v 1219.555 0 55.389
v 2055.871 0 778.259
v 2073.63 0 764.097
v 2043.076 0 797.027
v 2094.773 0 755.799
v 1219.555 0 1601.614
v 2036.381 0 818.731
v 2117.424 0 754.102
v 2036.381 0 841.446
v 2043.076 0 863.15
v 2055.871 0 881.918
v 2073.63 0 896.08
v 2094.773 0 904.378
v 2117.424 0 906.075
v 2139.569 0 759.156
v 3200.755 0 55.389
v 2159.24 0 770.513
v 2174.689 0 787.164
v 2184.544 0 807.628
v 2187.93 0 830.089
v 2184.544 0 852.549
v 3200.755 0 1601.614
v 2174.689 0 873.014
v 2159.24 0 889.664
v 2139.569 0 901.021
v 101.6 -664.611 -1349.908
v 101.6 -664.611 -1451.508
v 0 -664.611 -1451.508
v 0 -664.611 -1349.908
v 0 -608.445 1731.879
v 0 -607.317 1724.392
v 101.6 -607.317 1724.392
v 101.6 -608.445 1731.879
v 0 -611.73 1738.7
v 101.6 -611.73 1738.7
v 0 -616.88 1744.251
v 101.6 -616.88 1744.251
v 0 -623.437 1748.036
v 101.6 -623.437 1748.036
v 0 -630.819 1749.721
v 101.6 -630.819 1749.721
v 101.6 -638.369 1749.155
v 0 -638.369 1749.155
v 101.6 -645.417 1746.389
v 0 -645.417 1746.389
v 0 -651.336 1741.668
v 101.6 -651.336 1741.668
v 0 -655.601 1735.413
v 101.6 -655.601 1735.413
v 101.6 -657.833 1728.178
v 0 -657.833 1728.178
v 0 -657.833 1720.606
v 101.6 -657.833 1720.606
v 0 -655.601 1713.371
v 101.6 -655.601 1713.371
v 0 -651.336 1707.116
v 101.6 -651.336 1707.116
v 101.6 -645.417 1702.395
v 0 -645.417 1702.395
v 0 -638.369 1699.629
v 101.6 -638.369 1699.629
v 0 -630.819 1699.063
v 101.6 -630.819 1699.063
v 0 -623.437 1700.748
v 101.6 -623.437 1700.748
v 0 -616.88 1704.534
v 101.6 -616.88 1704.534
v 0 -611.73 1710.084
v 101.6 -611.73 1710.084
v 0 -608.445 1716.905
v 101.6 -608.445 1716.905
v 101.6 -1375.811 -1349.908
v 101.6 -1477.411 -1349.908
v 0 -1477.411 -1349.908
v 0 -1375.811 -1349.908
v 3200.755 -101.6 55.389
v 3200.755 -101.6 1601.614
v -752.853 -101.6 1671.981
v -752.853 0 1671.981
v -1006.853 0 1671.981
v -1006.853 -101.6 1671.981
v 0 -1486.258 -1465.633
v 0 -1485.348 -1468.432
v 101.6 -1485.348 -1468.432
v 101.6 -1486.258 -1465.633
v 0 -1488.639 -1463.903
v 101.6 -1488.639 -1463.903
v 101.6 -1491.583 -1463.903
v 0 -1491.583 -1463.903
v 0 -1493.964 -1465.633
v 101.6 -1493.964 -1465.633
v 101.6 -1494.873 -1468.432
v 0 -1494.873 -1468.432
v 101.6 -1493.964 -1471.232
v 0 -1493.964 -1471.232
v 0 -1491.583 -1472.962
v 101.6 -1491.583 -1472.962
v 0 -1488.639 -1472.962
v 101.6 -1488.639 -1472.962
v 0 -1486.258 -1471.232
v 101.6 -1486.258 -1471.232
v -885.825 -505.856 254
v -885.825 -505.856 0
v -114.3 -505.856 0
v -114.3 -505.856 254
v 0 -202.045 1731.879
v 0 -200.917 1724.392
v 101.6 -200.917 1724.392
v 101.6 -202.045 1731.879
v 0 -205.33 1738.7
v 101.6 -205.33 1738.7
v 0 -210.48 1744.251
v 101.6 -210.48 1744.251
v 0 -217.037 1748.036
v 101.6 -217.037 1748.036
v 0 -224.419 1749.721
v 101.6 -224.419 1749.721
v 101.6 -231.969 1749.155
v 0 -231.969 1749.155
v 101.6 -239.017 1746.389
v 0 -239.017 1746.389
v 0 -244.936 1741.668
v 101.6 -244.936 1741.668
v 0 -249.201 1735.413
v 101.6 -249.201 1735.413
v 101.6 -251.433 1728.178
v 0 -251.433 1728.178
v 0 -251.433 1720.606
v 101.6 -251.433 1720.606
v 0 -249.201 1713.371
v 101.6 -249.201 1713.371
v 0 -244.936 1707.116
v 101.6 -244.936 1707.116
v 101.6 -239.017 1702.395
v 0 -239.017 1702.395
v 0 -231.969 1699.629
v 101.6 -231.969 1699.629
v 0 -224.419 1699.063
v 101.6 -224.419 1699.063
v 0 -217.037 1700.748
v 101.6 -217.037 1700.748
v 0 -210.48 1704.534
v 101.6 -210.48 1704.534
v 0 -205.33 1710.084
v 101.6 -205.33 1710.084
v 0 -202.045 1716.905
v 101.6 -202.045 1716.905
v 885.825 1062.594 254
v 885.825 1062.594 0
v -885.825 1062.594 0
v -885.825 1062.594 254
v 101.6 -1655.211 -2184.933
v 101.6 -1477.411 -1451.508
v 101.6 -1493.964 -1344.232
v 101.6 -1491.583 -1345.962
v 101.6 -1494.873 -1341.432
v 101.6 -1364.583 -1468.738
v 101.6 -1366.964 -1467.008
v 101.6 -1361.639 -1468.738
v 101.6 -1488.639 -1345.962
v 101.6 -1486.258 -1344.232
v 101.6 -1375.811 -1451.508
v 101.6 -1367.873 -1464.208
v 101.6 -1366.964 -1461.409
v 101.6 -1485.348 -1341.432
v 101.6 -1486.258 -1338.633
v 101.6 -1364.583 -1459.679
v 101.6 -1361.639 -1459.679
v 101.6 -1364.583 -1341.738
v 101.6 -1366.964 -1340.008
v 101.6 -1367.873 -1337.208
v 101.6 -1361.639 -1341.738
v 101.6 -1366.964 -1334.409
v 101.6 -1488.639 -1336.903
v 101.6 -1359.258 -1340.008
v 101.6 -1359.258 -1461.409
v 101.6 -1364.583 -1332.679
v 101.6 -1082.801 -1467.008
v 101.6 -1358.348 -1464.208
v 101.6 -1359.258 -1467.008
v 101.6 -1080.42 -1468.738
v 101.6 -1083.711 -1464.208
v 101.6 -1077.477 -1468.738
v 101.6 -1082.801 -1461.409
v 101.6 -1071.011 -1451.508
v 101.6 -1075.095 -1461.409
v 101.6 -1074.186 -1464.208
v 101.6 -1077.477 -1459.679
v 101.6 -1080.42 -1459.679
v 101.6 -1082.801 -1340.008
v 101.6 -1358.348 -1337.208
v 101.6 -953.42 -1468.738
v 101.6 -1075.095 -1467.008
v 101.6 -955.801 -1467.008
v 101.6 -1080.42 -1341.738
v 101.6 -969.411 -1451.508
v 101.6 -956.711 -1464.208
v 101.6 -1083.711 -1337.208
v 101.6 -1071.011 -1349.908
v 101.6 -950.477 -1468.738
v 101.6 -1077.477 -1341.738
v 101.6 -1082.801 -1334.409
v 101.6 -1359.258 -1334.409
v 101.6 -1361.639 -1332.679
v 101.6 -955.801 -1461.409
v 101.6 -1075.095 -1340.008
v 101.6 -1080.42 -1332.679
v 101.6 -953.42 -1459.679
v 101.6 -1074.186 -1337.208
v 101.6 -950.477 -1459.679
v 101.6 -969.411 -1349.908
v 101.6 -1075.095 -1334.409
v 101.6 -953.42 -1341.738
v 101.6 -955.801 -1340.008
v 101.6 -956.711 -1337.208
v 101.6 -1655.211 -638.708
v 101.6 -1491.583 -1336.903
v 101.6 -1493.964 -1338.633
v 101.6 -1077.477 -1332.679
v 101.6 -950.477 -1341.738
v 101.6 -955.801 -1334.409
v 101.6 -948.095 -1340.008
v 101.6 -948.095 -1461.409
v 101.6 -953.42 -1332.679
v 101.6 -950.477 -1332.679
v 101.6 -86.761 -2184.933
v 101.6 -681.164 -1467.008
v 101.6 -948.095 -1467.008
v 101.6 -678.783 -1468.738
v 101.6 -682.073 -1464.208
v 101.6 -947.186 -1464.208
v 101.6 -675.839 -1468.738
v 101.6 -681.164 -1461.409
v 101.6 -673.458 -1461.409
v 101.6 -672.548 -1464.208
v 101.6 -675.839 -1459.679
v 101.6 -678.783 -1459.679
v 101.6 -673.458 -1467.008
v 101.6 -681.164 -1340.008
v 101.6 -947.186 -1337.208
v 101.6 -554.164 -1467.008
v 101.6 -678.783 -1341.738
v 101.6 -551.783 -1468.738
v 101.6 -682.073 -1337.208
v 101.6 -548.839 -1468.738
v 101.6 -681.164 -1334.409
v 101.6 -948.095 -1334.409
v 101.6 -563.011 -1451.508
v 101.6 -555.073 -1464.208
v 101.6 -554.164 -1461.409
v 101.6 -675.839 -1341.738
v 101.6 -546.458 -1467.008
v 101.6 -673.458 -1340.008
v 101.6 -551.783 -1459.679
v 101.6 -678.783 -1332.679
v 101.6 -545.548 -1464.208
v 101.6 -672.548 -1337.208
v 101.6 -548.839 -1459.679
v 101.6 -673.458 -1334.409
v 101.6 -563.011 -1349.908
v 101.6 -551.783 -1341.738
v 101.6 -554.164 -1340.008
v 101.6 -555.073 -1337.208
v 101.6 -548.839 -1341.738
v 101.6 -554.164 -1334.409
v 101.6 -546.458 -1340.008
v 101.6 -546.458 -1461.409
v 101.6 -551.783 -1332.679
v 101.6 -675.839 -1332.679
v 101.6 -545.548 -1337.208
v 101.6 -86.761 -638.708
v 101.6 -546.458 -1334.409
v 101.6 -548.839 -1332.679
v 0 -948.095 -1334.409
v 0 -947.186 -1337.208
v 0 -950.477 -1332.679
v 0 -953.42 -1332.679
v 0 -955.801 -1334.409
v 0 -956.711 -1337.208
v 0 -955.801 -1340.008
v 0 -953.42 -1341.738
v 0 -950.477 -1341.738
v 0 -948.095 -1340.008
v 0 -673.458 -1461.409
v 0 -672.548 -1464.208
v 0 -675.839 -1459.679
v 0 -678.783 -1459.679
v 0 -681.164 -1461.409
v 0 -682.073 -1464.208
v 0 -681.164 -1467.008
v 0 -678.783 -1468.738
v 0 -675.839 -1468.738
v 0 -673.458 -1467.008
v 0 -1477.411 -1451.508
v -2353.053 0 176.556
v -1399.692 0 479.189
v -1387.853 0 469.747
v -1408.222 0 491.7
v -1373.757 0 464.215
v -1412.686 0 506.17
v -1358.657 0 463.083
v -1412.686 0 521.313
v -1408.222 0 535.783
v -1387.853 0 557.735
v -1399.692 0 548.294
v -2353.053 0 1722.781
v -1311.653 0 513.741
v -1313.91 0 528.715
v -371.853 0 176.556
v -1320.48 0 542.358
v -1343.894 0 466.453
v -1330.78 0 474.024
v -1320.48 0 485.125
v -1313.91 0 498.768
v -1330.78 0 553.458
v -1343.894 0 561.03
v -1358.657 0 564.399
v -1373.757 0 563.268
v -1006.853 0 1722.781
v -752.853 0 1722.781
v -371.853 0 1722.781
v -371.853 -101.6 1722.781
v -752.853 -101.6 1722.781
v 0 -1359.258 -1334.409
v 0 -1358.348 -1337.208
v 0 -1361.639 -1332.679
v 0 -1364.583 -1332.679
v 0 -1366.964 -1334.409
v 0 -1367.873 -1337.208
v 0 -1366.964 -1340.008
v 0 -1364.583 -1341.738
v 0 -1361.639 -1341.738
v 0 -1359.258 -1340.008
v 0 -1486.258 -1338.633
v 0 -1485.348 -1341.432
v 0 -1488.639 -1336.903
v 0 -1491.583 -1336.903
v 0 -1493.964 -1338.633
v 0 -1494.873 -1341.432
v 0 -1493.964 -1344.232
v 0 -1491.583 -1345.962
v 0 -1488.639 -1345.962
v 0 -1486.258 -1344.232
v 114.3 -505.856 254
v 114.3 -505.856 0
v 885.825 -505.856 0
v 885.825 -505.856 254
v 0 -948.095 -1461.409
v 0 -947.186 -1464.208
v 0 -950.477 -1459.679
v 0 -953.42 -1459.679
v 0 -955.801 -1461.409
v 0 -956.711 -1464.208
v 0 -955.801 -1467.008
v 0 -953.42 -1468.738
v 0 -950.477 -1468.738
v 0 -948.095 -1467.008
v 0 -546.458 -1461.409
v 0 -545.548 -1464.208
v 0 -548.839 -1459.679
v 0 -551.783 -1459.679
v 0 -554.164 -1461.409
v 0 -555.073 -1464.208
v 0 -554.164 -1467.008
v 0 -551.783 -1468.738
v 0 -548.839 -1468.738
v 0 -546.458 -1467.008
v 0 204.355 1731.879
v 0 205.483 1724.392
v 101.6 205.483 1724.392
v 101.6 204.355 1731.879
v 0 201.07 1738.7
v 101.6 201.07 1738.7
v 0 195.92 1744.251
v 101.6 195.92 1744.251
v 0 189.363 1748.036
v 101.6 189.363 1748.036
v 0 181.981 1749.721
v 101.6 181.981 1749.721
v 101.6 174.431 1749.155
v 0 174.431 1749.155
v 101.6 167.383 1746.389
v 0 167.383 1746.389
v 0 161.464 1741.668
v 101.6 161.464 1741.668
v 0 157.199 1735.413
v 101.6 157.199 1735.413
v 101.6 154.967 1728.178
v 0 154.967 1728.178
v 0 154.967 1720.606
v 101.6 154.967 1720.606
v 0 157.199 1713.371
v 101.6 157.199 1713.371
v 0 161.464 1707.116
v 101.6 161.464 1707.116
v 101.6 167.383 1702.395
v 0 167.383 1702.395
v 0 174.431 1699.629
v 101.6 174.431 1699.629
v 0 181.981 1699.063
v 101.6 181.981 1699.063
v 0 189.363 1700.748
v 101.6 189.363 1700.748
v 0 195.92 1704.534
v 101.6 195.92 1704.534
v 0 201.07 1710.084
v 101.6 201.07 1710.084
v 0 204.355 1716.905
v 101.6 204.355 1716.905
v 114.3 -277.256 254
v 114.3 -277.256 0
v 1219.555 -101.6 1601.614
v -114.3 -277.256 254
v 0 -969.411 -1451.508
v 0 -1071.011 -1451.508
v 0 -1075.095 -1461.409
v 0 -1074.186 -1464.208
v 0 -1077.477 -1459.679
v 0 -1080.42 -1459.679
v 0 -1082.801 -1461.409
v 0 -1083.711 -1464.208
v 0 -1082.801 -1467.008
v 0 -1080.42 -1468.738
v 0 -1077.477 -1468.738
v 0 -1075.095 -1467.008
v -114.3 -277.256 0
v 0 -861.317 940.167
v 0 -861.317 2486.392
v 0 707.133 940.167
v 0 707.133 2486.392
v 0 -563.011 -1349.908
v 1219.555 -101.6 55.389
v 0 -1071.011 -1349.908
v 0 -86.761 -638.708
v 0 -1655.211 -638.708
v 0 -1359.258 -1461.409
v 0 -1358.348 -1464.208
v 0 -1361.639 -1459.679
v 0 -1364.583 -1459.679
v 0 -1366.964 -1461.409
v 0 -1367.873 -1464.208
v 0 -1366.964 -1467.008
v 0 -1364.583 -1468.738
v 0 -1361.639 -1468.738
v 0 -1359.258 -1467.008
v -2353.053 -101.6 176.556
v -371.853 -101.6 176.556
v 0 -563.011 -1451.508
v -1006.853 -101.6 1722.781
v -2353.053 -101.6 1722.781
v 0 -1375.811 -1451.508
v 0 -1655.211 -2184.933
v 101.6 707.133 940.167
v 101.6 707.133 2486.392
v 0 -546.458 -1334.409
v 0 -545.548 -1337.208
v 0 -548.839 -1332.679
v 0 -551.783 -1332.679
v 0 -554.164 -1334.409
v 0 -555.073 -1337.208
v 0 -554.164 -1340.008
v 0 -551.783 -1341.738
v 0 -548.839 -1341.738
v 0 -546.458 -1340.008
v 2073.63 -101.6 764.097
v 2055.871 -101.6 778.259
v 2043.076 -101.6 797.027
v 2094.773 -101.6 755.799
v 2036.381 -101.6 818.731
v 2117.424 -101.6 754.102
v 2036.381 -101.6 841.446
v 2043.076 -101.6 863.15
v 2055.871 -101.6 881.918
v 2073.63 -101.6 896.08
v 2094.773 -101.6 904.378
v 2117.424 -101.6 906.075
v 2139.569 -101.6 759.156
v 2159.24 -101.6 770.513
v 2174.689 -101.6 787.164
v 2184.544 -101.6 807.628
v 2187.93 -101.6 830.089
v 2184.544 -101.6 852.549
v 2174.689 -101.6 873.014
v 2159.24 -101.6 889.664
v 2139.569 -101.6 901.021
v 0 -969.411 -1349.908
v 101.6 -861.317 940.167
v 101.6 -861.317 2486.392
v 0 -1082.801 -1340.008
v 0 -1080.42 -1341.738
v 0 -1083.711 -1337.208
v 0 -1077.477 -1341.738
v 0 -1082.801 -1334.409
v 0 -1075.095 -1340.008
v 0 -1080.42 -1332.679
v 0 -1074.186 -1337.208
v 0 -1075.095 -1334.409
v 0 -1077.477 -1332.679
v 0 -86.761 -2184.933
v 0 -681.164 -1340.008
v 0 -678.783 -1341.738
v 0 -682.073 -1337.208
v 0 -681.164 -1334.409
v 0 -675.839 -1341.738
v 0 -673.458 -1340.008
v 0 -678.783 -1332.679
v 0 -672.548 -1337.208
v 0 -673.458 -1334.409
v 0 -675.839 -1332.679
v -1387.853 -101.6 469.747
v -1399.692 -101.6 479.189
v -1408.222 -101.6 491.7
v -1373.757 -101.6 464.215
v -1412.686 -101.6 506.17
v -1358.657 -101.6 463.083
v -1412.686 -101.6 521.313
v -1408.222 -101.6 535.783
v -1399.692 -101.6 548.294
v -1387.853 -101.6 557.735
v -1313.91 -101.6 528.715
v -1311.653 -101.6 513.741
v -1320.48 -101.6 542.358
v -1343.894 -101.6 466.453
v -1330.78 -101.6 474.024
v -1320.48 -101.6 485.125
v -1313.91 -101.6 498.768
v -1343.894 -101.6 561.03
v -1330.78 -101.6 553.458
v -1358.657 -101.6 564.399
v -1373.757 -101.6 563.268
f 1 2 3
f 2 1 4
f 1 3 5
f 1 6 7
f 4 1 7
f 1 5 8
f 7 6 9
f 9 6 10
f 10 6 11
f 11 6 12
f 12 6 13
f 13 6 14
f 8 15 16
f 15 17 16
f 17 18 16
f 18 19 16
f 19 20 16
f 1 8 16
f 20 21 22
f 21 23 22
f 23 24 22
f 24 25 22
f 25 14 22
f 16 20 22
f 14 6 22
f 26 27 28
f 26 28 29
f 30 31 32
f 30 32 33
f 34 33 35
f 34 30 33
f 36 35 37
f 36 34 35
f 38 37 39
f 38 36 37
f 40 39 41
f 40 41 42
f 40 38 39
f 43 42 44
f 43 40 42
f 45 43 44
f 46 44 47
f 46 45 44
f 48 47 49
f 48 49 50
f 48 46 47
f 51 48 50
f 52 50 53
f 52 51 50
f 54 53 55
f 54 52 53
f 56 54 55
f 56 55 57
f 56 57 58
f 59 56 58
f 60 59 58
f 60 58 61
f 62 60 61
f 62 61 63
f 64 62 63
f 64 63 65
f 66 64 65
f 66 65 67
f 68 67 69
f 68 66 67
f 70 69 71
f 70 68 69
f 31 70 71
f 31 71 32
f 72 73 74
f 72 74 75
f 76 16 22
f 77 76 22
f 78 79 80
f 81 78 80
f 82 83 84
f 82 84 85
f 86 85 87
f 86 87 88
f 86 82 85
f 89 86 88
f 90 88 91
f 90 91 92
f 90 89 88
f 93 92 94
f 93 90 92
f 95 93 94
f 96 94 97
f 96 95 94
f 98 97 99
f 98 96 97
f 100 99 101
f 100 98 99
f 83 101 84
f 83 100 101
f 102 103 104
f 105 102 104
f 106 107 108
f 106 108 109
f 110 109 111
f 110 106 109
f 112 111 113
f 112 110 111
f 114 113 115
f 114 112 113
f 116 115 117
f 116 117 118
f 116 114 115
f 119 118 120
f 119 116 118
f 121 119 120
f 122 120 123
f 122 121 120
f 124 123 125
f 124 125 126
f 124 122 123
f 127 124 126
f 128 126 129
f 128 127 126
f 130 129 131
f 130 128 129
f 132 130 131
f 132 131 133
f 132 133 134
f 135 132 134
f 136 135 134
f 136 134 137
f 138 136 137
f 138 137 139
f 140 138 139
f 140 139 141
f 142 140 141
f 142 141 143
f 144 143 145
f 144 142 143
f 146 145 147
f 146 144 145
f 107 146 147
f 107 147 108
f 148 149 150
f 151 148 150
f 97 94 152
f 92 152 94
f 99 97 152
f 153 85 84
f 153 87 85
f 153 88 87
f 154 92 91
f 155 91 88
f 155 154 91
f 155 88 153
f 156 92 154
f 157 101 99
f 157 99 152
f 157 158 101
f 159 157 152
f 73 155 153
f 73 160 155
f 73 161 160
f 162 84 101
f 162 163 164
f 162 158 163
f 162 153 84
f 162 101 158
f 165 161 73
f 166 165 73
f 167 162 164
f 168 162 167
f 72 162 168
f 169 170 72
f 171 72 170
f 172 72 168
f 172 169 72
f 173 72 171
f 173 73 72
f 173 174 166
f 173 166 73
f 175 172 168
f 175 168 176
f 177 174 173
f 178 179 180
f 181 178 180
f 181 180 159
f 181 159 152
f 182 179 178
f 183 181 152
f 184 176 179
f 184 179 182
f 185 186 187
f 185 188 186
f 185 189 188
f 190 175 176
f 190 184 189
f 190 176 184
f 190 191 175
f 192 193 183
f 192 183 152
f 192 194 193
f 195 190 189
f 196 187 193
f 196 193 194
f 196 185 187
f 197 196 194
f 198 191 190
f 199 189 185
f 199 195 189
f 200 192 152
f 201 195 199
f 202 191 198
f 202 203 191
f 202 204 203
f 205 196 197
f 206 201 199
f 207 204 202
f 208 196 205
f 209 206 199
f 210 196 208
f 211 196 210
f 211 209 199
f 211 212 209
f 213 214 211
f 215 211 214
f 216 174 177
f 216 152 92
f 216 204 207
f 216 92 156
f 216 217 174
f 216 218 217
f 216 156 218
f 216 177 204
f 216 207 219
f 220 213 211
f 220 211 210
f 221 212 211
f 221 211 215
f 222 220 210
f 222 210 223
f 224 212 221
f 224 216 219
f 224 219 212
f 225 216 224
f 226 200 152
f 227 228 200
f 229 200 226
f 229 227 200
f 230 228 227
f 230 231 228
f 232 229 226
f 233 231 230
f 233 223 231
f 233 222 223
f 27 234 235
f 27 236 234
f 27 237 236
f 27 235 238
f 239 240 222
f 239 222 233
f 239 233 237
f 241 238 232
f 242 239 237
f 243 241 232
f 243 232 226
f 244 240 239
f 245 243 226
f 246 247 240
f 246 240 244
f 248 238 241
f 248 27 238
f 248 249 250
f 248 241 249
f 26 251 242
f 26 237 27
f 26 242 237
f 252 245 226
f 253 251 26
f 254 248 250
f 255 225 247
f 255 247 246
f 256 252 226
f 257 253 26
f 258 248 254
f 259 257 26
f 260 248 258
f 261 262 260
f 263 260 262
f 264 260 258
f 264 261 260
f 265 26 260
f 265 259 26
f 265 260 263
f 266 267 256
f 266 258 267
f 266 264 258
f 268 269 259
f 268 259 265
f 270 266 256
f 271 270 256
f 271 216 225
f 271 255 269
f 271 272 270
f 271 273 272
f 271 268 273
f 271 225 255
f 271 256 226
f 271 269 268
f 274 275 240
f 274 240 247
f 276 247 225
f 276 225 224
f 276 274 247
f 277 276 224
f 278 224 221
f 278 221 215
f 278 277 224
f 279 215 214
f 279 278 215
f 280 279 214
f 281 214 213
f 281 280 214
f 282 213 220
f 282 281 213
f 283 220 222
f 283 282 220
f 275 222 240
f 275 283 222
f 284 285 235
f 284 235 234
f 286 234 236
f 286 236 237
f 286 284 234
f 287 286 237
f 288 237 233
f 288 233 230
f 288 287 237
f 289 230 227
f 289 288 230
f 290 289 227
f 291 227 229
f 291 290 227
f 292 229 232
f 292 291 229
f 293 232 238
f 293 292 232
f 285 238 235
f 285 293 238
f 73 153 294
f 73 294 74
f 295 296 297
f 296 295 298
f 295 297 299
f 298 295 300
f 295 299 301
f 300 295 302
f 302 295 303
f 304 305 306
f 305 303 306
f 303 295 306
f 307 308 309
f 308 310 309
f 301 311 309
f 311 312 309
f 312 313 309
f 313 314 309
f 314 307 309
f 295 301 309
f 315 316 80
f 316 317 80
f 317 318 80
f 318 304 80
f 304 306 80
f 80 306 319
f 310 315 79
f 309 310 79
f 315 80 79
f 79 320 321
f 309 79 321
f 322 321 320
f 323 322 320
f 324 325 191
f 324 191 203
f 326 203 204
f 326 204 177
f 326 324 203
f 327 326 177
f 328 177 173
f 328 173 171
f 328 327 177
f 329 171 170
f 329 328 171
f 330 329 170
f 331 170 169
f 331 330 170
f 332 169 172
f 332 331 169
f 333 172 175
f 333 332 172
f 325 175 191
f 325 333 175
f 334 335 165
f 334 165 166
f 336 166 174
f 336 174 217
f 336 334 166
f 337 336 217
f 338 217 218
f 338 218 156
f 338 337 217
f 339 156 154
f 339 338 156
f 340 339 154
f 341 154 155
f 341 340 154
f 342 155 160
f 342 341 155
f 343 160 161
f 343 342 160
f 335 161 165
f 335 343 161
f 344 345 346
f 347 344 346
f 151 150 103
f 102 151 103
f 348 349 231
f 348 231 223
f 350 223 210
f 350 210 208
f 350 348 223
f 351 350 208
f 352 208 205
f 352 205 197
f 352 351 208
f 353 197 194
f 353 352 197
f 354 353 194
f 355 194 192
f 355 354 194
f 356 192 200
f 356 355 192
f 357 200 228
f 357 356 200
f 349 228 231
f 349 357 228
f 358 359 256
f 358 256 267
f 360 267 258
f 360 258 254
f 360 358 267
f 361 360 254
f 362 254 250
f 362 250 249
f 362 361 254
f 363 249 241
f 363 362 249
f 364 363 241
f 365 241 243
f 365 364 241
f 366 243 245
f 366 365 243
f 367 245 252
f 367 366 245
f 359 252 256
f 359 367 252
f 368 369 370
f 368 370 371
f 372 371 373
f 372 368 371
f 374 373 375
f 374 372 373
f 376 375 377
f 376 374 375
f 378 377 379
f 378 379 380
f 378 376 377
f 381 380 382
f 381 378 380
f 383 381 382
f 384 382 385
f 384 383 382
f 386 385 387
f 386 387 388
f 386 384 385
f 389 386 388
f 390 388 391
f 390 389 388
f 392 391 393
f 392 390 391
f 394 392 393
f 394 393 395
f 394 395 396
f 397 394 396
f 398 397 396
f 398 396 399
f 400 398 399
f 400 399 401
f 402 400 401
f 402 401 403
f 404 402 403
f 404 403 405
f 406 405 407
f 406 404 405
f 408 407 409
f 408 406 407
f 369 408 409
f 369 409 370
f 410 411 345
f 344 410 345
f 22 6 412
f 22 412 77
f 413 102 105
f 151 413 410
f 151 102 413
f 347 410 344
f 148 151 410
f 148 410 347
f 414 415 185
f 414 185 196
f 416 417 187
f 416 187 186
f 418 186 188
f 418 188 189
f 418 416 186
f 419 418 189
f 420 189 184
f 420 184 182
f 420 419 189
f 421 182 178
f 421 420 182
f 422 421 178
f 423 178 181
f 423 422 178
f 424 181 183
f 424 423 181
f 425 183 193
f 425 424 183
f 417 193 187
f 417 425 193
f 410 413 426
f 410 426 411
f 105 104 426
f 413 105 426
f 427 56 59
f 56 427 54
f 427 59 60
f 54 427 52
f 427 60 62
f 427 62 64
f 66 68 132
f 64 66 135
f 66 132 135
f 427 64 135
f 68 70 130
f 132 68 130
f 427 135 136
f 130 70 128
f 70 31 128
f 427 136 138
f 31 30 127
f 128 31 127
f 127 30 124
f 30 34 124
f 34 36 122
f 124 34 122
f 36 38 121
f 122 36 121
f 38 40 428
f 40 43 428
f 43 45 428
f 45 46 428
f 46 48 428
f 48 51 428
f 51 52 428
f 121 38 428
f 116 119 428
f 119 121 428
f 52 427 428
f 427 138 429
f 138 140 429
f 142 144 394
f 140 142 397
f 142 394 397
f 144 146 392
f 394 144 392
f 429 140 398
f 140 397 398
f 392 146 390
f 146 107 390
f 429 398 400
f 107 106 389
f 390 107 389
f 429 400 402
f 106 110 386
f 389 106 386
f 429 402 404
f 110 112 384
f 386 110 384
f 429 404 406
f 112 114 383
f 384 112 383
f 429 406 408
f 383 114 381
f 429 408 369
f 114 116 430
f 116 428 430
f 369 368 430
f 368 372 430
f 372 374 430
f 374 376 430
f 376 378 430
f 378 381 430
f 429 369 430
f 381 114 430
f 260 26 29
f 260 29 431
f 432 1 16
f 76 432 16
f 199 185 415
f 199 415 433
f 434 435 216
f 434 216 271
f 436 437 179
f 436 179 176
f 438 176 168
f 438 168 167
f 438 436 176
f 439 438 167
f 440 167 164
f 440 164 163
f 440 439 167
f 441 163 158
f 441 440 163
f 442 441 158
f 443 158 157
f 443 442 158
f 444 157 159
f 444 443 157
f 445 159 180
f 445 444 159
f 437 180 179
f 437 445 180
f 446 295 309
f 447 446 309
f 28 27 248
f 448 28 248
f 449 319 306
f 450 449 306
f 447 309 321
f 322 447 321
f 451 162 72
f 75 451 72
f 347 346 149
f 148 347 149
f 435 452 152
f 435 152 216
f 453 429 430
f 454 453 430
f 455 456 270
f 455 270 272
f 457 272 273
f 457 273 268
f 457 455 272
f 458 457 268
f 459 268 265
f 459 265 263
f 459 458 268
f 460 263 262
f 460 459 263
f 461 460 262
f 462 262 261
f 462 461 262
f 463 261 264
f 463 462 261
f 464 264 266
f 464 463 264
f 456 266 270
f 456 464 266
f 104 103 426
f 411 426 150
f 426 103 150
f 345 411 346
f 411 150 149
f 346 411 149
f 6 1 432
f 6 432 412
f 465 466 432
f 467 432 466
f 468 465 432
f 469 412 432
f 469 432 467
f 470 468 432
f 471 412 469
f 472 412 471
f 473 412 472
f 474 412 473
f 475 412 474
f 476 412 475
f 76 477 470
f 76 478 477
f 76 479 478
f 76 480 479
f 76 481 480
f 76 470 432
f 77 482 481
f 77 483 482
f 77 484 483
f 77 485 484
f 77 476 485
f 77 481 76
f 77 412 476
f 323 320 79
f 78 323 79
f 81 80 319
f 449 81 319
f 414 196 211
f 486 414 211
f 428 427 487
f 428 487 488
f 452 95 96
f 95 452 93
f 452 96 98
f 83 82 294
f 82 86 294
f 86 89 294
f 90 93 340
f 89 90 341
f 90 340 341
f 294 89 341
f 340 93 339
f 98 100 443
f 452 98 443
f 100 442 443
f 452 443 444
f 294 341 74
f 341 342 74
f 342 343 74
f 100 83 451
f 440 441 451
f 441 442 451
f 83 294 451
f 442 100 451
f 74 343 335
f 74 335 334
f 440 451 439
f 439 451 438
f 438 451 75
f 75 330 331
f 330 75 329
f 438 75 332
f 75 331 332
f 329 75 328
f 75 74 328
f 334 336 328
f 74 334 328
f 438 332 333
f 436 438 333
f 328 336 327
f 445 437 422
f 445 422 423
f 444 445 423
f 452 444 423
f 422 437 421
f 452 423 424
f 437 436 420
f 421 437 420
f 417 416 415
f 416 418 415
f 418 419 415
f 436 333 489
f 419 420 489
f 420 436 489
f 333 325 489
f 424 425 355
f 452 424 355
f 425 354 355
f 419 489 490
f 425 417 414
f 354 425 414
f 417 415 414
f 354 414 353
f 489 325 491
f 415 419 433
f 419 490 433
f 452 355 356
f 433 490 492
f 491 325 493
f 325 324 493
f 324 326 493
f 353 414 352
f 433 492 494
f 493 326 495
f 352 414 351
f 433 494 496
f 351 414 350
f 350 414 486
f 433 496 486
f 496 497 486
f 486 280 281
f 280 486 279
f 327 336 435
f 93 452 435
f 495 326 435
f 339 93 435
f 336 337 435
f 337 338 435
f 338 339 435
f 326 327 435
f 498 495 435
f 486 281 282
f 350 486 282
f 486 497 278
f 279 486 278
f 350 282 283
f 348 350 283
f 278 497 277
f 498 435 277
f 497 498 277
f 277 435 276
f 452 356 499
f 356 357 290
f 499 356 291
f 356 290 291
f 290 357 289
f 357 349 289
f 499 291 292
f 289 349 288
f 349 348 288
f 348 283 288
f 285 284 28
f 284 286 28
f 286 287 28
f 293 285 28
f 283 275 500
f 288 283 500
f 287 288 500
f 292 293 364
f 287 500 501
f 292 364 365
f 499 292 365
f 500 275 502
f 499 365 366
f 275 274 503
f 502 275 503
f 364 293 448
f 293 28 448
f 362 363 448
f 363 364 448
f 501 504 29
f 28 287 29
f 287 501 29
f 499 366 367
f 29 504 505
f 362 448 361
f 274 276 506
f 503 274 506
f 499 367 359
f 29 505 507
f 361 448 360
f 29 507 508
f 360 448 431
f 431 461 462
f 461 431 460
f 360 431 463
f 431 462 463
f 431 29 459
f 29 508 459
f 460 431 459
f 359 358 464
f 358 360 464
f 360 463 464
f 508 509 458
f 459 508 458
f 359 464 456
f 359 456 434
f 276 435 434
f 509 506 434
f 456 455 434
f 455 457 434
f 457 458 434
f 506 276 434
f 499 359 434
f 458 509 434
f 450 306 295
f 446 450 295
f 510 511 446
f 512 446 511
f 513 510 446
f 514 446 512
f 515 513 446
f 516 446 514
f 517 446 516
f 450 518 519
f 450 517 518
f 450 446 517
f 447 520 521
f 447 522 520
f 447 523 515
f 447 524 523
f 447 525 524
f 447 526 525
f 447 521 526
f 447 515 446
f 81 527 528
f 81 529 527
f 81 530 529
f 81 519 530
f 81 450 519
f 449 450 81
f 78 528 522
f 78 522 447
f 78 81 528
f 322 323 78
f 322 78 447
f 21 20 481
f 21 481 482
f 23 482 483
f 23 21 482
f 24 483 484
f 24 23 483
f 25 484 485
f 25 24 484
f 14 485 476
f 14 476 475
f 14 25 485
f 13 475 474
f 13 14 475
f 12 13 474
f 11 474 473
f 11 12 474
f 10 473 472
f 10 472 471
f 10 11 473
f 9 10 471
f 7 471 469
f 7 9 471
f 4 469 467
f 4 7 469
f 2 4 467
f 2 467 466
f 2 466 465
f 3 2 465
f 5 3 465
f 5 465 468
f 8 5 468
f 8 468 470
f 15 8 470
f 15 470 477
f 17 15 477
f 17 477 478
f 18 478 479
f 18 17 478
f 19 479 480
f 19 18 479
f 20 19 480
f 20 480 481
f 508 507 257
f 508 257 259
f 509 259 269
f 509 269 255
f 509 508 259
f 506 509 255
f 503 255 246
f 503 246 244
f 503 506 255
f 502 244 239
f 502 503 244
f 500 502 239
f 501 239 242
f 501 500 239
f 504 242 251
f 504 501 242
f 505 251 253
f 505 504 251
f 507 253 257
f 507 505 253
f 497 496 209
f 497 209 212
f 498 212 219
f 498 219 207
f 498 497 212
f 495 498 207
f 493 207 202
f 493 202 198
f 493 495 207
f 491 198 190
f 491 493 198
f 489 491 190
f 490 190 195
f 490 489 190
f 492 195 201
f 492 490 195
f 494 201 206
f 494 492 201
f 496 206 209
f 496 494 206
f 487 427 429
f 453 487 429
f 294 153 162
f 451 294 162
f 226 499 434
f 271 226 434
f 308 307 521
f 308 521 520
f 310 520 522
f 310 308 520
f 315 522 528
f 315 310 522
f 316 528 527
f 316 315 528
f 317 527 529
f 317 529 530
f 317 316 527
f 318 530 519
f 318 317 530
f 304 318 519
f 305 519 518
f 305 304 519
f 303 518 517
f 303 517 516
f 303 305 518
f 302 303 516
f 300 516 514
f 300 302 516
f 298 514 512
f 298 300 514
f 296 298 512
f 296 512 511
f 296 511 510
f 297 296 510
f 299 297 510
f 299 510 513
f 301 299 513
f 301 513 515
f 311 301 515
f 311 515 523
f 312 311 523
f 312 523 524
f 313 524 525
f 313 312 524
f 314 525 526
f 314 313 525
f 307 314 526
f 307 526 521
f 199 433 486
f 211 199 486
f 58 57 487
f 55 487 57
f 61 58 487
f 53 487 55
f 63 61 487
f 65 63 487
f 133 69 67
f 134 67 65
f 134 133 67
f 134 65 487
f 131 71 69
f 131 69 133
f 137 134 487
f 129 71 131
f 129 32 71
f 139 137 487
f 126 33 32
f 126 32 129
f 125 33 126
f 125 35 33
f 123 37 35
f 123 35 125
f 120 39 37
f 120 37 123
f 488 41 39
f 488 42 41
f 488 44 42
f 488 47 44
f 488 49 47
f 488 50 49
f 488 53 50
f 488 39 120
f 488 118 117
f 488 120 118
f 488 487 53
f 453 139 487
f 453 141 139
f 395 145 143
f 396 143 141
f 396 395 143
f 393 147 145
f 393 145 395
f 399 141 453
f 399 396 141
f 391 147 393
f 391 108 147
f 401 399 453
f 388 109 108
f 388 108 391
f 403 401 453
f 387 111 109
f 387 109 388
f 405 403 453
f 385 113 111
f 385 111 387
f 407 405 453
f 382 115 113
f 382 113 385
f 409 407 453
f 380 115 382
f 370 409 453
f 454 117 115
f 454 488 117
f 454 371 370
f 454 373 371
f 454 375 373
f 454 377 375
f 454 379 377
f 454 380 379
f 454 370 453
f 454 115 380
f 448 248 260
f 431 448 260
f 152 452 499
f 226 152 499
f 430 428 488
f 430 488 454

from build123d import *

# Parameters (mm, degrees)
F3_R     = 50.8
F5_DEPTH = 101.6
F4_W     = 1981.2
F4_H     = 1546.225
F4_R     = 76.2
F6_DEPTH = 101.6
F1_W     = 1568.45
F1_H     = 1546.225
F1_R     = 25.4
F7_DEPTH = 101.6
F8_DEPTH = 254
F2_W     = 1568.45
F2_H     = 1546.225
F2_R     = 4.7625
F2_W_2   = 101.6
F2_H_2   = 101.6
F9_DEPTH = 101.6


with BuildPart() as f5:
    # F3 (on Front) → F5 (new body)
    with BuildSketch(Plane.XZ):
        Polygon((-2353.0530816555, 1722.7813414584), (-2353.0530816555, 176.5563414584), (-371.8530816555, 176.5563414584), (-371.8530816555, 1722.7813414584), (-752.8530816555, 1722.7813414584), (-752.8530816555, 1671.9813414584), (-1006.8530816555, 1671.9813414584), (-1006.8530816555, 1722.7813414584), align=None)
        with Locations((-1362.4530816555, 513.7413414584)):
            Circle(F3_R, mode=Mode.SUBTRACT)
    extrude(amount=F5_DEPTH)


with BuildPart() as f6:
    # F4 (on Front) → F6 (new body)
    with BuildSketch(Plane.XZ):
        with Locations((2210.1545845985, 828.5010133985)):
            Rectangle(F4_W, F4_H)
        with Locations((2111.7295845985, 830.0885133985)):
            Circle(F4_R, mode=Mode.SUBTRACT)
    extrude(amount=F6_DEPTH)


with BuildPart() as f7:
    # F1 (on Right) → F7 (new body)
    with BuildSketch(Plane.YZ):
        with Locations((-77.0916448283, 1713.2795558453)):
            Rectangle(F1_W, F1_H)
        with Locations((-632.7166448283, 1724.3920558453)):
            Circle(F1_R, mode=Mode.SUBTRACT)
        with Locations((-226.3166448283, 1724.3920558453)):
            Circle(F1_R, mode=Mode.SUBTRACT)
        with Locations((180.0833551717, 1724.3920558453)):
            Circle(F1_R, mode=Mode.SUBTRACT)
    extrude(amount=F7_DEPTH)


with BuildPart() as f8:
    # F0 (on Top) → F8 (new body)
    with BuildSketch(Plane.XY):
        Polygon((-885.825, 1062.5936732292), (-885.825, -505.8563267708), (-114.3, -505.8563267708), (-114.3, -277.2563267708), (114.3, -277.2563267708), (114.3, -505.8563267708), (885.825, -505.8563267708), (885.825, 1062.5936732292), align=None)
    extrude(amount=F8_DEPTH)


with BuildPart() as f9:
    # F2 (on Right) → F9 (new body)
    with BuildSketch(Plane.YZ):
        with Locations((-870.9858280182, -1411.8208845873)):
            Rectangle(F2_W, F2_H)
        with Locations((-1490.1108280182, -1468.4322137833)):
            Circle(F2_R, mode=Mode.SUBTRACT)
        with Locations((-1363.1108280182, -1464.2083845873)):
            Circle(F2_R, mode=Mode.SUBTRACT)
        with Locations((-1078.9483280182, -1464.2083845873)):
            Circle(F2_R, mode=Mode.SUBTRACT)
        with Locations((-951.9483280182, -1464.2083845873)):
            Circle(F2_R, mode=Mode.SUBTRACT)
        with Locations((-677.3108280182, -1464.2083845873)):
            Circle(F2_R, mode=Mode.SUBTRACT)
        with Locations((-550.3108280182, -1464.2083845873)):
            Circle(F2_R, mode=Mode.SUBTRACT)
        with Locations((-1490.1108280182, -1341.4322137833)):
            Circle(F2_R, mode=Mode.SUBTRACT)
        with Locations((-1426.6108280182, -1400.7083845873)):
            Rectangle(F2_W_2, F2_H_2, mode=Mode.SUBTRACT)
        with Locations((-1363.1108280182, -1337.2083845873)):
            Circle(F2_R, mode=Mode.SUBTRACT)
        with Locations((-1078.9483280182, -1337.2083845873)):
            Circle(F2_R, mode=Mode.SUBTRACT)
        with Locations((-1020.2108280182, -1400.7083845873)):
            Rectangle(F2_W_2, F2_H_2, mode=Mode.SUBTRACT)
        with Locations((-951.9483280182, -1337.2083845873)):
            Circle(F2_R, mode=Mode.SUBTRACT)
        with Locations((-677.3108280182, -1337.2083845873)):
            Circle(F2_R, mode=Mode.SUBTRACT)
        with Locations((-613.8108280182, -1400.7083845873)):
            Rectangle(F2_W_2, F2_H_2, mode=Mode.SUBTRACT)
        with Locations((-550.3108280182, -1337.2083845873)):
            Circle(F2_R, mode=Mode.SUBTRACT)
    extrude(amount=F9_DEPTH)


solid = Compound([f5.part, f6.part, f7.part, f8.part, f9.part])
